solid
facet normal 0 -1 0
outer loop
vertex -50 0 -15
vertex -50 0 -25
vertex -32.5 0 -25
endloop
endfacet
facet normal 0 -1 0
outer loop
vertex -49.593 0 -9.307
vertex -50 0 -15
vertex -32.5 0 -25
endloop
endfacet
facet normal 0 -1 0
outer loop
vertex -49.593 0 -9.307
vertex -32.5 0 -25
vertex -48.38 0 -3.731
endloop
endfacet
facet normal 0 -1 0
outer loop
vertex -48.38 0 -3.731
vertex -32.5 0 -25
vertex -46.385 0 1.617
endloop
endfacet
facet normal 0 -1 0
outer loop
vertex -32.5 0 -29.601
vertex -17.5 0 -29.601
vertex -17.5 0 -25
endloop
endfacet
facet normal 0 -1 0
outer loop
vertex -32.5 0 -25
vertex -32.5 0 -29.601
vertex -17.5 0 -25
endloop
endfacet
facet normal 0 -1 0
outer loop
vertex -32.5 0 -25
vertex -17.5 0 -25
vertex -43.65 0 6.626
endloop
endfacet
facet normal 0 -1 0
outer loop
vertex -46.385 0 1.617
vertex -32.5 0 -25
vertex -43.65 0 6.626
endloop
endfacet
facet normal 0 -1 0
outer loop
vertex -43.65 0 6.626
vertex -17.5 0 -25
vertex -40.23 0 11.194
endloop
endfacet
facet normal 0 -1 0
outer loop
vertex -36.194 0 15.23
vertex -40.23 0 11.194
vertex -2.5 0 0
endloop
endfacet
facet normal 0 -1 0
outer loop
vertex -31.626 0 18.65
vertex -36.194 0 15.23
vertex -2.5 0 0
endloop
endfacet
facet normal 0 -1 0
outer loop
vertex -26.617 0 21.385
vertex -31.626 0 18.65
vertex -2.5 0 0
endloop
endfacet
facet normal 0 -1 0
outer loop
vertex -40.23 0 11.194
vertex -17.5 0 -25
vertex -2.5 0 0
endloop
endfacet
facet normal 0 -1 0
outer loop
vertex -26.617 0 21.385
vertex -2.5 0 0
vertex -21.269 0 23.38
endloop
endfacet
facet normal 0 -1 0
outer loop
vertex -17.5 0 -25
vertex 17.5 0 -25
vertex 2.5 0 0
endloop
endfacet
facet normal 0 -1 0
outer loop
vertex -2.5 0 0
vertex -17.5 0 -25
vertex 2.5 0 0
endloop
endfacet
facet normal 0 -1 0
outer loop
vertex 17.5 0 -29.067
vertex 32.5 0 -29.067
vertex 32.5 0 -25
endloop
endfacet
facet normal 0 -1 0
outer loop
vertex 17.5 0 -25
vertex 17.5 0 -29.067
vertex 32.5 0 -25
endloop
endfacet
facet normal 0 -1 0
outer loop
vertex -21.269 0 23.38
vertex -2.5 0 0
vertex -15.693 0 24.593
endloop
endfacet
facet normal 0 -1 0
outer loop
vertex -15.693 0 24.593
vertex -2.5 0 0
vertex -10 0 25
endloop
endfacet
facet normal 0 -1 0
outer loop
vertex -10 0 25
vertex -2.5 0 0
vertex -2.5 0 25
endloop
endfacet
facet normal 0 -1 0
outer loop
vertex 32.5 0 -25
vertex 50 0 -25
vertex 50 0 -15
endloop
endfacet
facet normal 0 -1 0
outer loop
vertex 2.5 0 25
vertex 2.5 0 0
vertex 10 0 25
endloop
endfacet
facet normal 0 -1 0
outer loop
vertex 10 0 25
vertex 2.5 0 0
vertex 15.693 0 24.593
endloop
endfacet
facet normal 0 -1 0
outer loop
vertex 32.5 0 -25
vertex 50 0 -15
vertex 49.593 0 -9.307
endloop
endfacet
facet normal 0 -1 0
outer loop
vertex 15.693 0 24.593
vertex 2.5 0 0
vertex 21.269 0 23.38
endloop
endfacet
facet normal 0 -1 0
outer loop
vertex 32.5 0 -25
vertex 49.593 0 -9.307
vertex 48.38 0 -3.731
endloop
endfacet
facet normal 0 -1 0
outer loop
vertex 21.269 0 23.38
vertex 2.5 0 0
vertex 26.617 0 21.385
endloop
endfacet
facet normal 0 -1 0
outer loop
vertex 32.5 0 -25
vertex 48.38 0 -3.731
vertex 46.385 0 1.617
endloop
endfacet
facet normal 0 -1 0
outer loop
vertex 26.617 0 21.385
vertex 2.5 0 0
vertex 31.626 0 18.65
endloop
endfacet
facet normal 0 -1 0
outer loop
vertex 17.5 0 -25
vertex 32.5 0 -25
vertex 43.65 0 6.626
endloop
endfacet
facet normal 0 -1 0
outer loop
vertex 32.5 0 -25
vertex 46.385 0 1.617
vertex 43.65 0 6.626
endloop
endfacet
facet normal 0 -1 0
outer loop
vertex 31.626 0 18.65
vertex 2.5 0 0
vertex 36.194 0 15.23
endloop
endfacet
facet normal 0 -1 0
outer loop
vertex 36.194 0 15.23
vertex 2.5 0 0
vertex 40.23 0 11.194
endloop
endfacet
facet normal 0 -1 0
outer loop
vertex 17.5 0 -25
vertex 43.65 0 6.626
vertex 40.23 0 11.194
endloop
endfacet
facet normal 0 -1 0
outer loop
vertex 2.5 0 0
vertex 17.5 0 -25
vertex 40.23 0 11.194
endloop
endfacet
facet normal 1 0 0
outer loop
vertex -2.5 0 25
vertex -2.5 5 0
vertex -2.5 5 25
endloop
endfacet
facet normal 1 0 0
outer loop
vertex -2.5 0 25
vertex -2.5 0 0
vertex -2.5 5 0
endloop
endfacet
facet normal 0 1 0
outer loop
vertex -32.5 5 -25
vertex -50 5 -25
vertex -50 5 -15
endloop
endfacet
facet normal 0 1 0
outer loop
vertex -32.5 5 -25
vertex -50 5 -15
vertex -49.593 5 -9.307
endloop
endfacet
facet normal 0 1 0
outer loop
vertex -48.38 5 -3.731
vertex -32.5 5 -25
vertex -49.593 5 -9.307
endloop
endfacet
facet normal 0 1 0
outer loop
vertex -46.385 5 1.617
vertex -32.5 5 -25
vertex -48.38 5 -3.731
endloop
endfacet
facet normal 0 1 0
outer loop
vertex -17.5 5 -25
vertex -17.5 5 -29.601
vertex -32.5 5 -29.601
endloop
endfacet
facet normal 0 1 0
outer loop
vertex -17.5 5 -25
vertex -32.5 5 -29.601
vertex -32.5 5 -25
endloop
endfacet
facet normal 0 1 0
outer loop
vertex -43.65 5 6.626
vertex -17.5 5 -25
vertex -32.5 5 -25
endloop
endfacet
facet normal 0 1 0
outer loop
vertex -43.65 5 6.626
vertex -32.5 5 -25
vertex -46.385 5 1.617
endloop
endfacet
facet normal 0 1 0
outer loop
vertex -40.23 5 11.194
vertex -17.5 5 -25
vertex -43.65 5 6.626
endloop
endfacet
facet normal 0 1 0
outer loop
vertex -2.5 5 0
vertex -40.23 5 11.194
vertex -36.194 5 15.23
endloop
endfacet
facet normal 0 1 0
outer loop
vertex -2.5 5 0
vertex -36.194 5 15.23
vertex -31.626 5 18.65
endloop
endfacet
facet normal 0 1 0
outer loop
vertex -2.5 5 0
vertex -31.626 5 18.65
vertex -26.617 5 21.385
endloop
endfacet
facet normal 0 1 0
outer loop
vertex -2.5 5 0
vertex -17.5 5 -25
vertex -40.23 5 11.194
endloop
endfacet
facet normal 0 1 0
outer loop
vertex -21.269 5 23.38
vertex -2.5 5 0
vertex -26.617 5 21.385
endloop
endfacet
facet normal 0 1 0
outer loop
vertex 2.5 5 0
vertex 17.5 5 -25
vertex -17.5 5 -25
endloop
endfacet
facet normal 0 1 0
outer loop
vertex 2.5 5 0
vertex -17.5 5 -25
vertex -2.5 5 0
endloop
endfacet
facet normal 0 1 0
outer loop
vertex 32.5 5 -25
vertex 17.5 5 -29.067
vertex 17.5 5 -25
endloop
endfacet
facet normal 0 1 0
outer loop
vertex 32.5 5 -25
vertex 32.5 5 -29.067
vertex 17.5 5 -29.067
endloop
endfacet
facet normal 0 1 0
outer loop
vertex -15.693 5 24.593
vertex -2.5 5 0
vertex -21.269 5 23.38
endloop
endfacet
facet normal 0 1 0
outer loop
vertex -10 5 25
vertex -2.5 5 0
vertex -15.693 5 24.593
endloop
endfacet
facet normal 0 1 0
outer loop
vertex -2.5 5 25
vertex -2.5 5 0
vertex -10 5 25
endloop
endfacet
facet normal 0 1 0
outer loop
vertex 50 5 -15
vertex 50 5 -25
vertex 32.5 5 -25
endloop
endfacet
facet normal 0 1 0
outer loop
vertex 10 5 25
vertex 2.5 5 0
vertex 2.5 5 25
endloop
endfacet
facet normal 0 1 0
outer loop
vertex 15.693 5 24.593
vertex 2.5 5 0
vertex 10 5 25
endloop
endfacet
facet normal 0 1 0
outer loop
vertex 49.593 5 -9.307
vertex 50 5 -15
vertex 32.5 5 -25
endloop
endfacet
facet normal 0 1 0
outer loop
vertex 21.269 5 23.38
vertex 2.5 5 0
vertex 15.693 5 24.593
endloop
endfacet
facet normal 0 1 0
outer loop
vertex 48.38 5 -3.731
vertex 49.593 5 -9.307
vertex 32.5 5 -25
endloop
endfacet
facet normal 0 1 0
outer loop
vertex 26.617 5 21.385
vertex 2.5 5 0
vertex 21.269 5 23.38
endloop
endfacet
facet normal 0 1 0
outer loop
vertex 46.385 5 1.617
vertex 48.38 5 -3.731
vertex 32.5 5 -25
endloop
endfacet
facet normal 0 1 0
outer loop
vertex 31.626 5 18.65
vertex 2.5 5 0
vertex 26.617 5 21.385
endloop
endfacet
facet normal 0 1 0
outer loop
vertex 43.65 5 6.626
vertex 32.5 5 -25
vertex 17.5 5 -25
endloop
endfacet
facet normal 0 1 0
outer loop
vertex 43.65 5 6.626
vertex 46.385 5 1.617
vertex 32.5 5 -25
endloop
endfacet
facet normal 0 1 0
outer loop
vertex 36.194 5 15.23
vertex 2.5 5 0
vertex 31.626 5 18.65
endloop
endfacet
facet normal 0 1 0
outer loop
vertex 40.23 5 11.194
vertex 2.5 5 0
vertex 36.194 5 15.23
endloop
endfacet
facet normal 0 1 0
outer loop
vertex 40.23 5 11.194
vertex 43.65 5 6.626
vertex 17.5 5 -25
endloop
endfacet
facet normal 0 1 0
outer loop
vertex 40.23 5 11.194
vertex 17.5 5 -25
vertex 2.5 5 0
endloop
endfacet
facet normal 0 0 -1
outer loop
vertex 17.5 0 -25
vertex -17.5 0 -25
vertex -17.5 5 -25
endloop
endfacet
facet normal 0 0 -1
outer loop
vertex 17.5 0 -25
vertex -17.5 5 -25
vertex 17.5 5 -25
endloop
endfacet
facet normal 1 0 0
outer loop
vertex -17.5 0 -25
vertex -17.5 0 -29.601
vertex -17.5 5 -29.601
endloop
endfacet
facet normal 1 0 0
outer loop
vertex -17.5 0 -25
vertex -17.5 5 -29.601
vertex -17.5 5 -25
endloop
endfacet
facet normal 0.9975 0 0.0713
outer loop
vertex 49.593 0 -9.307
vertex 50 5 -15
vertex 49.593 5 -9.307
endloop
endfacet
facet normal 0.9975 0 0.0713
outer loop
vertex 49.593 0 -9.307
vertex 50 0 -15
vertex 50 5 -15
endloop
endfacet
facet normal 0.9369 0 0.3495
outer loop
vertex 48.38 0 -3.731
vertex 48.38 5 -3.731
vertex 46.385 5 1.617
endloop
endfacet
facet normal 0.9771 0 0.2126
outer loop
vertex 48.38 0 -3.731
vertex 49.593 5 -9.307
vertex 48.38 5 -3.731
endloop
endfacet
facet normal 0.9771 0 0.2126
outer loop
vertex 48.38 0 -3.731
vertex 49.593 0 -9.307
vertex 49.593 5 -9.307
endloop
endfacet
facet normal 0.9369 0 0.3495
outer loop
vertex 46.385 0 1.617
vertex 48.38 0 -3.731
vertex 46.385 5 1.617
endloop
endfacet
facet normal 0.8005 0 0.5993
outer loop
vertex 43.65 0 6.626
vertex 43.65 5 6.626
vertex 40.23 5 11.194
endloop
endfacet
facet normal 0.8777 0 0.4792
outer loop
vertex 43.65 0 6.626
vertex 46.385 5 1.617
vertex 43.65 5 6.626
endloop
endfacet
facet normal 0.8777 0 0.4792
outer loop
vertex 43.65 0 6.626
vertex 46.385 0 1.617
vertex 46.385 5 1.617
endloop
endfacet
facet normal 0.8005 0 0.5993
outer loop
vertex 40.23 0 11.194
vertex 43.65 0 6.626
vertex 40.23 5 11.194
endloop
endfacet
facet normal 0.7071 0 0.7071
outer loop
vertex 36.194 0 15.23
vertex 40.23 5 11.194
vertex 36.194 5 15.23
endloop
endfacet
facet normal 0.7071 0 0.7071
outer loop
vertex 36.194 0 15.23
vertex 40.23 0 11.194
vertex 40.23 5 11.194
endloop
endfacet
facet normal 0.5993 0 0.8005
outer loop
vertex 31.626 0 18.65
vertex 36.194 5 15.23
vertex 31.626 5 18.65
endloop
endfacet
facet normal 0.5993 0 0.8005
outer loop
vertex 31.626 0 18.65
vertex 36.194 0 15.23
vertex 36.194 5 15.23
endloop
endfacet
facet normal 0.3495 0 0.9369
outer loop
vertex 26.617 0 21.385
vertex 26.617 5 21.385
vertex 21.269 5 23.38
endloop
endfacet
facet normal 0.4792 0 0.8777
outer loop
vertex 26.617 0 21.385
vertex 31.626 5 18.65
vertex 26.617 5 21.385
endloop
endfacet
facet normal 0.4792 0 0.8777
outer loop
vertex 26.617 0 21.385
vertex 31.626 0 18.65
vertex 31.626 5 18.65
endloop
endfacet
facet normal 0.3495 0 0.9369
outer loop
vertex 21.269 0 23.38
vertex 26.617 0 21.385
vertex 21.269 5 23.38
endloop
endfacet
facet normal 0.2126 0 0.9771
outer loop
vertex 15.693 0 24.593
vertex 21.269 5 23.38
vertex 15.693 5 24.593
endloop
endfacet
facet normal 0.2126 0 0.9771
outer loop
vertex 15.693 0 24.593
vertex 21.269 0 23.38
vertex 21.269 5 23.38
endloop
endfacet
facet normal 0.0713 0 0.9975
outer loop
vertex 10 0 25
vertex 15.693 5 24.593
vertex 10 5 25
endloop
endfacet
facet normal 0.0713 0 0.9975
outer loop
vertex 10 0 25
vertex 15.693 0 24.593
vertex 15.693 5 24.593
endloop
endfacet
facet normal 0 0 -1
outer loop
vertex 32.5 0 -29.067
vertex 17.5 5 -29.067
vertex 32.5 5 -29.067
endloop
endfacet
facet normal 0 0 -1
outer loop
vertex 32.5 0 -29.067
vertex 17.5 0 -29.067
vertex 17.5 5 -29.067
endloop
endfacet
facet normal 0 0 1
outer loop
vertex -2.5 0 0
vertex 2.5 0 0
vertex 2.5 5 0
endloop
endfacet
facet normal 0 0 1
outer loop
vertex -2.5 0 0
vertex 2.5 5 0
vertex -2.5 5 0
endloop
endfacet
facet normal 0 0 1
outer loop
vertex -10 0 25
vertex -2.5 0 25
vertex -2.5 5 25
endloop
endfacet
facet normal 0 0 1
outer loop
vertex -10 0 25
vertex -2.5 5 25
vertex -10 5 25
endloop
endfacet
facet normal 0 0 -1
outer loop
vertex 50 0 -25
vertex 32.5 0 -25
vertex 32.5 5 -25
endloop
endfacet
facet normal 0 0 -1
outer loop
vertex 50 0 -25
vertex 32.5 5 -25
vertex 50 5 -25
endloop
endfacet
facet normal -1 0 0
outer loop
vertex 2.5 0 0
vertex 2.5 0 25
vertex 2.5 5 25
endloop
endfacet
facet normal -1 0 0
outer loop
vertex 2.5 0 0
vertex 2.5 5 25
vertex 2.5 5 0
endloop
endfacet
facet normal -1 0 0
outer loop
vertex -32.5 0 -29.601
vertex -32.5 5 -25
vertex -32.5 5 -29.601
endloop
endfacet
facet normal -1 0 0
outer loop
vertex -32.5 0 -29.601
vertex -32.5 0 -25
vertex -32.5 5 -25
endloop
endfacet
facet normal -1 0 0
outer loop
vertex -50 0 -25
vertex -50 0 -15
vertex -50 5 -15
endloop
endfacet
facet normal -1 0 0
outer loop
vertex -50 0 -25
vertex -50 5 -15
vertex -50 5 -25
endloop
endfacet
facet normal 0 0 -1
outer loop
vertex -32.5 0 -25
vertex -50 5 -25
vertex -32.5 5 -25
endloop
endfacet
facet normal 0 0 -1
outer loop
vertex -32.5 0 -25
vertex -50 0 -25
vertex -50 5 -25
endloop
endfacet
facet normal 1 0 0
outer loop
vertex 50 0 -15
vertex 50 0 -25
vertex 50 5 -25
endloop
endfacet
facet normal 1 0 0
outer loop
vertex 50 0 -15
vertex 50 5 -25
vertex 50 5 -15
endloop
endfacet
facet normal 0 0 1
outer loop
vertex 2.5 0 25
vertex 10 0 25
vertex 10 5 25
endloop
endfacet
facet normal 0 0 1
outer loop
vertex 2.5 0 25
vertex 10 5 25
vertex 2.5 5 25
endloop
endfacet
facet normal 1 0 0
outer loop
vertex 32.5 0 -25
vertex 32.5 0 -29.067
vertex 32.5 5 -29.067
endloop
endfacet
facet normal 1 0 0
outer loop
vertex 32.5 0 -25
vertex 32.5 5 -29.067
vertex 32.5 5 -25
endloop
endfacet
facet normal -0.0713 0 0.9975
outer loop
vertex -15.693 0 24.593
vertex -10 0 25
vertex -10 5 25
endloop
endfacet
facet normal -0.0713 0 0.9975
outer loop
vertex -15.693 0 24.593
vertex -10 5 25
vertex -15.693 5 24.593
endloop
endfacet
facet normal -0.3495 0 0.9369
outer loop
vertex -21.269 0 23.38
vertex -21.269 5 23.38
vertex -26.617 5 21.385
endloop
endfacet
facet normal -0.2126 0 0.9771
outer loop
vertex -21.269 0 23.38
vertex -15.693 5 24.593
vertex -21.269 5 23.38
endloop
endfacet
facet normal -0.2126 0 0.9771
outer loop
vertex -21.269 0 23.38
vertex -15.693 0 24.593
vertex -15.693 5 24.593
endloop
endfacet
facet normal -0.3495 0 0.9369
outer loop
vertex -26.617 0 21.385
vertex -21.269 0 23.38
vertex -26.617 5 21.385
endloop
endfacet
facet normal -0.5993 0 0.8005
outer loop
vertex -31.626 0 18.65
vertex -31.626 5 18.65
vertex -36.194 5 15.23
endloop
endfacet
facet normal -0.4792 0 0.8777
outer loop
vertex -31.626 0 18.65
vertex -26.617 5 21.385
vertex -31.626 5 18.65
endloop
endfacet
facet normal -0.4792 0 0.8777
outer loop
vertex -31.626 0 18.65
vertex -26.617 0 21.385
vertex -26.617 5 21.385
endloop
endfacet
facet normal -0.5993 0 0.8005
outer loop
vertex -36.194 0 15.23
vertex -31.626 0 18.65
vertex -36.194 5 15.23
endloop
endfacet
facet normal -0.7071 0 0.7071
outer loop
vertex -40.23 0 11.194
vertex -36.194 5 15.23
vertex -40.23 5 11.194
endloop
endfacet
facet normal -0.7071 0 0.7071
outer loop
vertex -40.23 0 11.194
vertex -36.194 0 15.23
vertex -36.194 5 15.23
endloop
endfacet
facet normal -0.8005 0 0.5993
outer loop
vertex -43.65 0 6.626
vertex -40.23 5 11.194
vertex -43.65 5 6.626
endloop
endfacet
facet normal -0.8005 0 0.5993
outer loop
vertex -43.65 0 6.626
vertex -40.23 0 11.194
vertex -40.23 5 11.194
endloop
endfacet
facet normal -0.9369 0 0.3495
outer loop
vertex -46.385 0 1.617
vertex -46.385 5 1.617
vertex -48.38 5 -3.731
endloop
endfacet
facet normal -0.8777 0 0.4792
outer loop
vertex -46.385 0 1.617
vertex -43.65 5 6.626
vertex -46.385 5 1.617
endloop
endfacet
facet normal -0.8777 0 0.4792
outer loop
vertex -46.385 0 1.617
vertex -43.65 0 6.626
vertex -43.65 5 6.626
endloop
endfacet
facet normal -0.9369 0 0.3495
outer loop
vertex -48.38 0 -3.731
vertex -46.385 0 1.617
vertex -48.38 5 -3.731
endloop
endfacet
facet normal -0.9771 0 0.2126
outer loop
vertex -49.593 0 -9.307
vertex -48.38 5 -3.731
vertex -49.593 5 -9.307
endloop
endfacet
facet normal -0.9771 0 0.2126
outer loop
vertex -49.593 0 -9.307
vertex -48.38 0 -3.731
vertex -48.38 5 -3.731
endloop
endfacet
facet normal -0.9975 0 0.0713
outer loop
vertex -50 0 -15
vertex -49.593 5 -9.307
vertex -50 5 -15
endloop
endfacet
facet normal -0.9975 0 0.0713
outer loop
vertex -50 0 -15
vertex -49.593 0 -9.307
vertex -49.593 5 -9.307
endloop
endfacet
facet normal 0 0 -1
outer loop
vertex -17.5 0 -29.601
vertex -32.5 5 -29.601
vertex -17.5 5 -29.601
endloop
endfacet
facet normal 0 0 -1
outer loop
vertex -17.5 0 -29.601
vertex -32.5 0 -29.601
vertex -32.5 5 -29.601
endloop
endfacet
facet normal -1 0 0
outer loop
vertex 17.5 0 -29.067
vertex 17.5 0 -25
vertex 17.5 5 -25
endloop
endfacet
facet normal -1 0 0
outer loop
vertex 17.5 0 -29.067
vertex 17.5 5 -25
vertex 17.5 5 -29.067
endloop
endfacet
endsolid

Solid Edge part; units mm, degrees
sketch "Sketch1" plane through (0, 0, 0) normal (0, -1, 0) x (1, 0, 0)
  arc A0 (-50, -15) -> (-10, 25) centre (-10, -15) cw
  line L0 (-2.5, 25) -> (-10, 25)
  line L1 (-2.5, 0) -> (-2.5, 25)
  line L2 (2.5, 0) -> (-2.5, 0)
  line L3 (2.5, 25) -> (2.5, 0)
  line L4 (10, 25) -> (2.5, 25)
  arc A1 (10, 25) -> (50, -15) centre (10, -15) cw
  line L5 (50, -25) -> (50, -15)
  line L6 (32.5, -25) -> (50, -25)
  line L7 (32.5, -29.067) -> (32.5, -25)
  line L8 (17.5, -29.067) -> (32.5, -29.067)
  line L9 (17.5, -25) -> (17.5, -29.067)
  line L10 (-17.5, -25) -> (17.5, -25)
  line L11 (-17.5, -29.6011) -> (-17.5, -25)
  line L12 (-32.5, -29.6011) -> (-17.5, -29.6011)
  line L13 (-32.5, -25) -> (-32.5, -29.6011)
  line L14 (-50, -25) -> (-32.5, -25)
  line L15 (-50, -15) -> (-50, -25)
extrude "Protrusion1" add sketch "Sketch1" against normal blind 5
